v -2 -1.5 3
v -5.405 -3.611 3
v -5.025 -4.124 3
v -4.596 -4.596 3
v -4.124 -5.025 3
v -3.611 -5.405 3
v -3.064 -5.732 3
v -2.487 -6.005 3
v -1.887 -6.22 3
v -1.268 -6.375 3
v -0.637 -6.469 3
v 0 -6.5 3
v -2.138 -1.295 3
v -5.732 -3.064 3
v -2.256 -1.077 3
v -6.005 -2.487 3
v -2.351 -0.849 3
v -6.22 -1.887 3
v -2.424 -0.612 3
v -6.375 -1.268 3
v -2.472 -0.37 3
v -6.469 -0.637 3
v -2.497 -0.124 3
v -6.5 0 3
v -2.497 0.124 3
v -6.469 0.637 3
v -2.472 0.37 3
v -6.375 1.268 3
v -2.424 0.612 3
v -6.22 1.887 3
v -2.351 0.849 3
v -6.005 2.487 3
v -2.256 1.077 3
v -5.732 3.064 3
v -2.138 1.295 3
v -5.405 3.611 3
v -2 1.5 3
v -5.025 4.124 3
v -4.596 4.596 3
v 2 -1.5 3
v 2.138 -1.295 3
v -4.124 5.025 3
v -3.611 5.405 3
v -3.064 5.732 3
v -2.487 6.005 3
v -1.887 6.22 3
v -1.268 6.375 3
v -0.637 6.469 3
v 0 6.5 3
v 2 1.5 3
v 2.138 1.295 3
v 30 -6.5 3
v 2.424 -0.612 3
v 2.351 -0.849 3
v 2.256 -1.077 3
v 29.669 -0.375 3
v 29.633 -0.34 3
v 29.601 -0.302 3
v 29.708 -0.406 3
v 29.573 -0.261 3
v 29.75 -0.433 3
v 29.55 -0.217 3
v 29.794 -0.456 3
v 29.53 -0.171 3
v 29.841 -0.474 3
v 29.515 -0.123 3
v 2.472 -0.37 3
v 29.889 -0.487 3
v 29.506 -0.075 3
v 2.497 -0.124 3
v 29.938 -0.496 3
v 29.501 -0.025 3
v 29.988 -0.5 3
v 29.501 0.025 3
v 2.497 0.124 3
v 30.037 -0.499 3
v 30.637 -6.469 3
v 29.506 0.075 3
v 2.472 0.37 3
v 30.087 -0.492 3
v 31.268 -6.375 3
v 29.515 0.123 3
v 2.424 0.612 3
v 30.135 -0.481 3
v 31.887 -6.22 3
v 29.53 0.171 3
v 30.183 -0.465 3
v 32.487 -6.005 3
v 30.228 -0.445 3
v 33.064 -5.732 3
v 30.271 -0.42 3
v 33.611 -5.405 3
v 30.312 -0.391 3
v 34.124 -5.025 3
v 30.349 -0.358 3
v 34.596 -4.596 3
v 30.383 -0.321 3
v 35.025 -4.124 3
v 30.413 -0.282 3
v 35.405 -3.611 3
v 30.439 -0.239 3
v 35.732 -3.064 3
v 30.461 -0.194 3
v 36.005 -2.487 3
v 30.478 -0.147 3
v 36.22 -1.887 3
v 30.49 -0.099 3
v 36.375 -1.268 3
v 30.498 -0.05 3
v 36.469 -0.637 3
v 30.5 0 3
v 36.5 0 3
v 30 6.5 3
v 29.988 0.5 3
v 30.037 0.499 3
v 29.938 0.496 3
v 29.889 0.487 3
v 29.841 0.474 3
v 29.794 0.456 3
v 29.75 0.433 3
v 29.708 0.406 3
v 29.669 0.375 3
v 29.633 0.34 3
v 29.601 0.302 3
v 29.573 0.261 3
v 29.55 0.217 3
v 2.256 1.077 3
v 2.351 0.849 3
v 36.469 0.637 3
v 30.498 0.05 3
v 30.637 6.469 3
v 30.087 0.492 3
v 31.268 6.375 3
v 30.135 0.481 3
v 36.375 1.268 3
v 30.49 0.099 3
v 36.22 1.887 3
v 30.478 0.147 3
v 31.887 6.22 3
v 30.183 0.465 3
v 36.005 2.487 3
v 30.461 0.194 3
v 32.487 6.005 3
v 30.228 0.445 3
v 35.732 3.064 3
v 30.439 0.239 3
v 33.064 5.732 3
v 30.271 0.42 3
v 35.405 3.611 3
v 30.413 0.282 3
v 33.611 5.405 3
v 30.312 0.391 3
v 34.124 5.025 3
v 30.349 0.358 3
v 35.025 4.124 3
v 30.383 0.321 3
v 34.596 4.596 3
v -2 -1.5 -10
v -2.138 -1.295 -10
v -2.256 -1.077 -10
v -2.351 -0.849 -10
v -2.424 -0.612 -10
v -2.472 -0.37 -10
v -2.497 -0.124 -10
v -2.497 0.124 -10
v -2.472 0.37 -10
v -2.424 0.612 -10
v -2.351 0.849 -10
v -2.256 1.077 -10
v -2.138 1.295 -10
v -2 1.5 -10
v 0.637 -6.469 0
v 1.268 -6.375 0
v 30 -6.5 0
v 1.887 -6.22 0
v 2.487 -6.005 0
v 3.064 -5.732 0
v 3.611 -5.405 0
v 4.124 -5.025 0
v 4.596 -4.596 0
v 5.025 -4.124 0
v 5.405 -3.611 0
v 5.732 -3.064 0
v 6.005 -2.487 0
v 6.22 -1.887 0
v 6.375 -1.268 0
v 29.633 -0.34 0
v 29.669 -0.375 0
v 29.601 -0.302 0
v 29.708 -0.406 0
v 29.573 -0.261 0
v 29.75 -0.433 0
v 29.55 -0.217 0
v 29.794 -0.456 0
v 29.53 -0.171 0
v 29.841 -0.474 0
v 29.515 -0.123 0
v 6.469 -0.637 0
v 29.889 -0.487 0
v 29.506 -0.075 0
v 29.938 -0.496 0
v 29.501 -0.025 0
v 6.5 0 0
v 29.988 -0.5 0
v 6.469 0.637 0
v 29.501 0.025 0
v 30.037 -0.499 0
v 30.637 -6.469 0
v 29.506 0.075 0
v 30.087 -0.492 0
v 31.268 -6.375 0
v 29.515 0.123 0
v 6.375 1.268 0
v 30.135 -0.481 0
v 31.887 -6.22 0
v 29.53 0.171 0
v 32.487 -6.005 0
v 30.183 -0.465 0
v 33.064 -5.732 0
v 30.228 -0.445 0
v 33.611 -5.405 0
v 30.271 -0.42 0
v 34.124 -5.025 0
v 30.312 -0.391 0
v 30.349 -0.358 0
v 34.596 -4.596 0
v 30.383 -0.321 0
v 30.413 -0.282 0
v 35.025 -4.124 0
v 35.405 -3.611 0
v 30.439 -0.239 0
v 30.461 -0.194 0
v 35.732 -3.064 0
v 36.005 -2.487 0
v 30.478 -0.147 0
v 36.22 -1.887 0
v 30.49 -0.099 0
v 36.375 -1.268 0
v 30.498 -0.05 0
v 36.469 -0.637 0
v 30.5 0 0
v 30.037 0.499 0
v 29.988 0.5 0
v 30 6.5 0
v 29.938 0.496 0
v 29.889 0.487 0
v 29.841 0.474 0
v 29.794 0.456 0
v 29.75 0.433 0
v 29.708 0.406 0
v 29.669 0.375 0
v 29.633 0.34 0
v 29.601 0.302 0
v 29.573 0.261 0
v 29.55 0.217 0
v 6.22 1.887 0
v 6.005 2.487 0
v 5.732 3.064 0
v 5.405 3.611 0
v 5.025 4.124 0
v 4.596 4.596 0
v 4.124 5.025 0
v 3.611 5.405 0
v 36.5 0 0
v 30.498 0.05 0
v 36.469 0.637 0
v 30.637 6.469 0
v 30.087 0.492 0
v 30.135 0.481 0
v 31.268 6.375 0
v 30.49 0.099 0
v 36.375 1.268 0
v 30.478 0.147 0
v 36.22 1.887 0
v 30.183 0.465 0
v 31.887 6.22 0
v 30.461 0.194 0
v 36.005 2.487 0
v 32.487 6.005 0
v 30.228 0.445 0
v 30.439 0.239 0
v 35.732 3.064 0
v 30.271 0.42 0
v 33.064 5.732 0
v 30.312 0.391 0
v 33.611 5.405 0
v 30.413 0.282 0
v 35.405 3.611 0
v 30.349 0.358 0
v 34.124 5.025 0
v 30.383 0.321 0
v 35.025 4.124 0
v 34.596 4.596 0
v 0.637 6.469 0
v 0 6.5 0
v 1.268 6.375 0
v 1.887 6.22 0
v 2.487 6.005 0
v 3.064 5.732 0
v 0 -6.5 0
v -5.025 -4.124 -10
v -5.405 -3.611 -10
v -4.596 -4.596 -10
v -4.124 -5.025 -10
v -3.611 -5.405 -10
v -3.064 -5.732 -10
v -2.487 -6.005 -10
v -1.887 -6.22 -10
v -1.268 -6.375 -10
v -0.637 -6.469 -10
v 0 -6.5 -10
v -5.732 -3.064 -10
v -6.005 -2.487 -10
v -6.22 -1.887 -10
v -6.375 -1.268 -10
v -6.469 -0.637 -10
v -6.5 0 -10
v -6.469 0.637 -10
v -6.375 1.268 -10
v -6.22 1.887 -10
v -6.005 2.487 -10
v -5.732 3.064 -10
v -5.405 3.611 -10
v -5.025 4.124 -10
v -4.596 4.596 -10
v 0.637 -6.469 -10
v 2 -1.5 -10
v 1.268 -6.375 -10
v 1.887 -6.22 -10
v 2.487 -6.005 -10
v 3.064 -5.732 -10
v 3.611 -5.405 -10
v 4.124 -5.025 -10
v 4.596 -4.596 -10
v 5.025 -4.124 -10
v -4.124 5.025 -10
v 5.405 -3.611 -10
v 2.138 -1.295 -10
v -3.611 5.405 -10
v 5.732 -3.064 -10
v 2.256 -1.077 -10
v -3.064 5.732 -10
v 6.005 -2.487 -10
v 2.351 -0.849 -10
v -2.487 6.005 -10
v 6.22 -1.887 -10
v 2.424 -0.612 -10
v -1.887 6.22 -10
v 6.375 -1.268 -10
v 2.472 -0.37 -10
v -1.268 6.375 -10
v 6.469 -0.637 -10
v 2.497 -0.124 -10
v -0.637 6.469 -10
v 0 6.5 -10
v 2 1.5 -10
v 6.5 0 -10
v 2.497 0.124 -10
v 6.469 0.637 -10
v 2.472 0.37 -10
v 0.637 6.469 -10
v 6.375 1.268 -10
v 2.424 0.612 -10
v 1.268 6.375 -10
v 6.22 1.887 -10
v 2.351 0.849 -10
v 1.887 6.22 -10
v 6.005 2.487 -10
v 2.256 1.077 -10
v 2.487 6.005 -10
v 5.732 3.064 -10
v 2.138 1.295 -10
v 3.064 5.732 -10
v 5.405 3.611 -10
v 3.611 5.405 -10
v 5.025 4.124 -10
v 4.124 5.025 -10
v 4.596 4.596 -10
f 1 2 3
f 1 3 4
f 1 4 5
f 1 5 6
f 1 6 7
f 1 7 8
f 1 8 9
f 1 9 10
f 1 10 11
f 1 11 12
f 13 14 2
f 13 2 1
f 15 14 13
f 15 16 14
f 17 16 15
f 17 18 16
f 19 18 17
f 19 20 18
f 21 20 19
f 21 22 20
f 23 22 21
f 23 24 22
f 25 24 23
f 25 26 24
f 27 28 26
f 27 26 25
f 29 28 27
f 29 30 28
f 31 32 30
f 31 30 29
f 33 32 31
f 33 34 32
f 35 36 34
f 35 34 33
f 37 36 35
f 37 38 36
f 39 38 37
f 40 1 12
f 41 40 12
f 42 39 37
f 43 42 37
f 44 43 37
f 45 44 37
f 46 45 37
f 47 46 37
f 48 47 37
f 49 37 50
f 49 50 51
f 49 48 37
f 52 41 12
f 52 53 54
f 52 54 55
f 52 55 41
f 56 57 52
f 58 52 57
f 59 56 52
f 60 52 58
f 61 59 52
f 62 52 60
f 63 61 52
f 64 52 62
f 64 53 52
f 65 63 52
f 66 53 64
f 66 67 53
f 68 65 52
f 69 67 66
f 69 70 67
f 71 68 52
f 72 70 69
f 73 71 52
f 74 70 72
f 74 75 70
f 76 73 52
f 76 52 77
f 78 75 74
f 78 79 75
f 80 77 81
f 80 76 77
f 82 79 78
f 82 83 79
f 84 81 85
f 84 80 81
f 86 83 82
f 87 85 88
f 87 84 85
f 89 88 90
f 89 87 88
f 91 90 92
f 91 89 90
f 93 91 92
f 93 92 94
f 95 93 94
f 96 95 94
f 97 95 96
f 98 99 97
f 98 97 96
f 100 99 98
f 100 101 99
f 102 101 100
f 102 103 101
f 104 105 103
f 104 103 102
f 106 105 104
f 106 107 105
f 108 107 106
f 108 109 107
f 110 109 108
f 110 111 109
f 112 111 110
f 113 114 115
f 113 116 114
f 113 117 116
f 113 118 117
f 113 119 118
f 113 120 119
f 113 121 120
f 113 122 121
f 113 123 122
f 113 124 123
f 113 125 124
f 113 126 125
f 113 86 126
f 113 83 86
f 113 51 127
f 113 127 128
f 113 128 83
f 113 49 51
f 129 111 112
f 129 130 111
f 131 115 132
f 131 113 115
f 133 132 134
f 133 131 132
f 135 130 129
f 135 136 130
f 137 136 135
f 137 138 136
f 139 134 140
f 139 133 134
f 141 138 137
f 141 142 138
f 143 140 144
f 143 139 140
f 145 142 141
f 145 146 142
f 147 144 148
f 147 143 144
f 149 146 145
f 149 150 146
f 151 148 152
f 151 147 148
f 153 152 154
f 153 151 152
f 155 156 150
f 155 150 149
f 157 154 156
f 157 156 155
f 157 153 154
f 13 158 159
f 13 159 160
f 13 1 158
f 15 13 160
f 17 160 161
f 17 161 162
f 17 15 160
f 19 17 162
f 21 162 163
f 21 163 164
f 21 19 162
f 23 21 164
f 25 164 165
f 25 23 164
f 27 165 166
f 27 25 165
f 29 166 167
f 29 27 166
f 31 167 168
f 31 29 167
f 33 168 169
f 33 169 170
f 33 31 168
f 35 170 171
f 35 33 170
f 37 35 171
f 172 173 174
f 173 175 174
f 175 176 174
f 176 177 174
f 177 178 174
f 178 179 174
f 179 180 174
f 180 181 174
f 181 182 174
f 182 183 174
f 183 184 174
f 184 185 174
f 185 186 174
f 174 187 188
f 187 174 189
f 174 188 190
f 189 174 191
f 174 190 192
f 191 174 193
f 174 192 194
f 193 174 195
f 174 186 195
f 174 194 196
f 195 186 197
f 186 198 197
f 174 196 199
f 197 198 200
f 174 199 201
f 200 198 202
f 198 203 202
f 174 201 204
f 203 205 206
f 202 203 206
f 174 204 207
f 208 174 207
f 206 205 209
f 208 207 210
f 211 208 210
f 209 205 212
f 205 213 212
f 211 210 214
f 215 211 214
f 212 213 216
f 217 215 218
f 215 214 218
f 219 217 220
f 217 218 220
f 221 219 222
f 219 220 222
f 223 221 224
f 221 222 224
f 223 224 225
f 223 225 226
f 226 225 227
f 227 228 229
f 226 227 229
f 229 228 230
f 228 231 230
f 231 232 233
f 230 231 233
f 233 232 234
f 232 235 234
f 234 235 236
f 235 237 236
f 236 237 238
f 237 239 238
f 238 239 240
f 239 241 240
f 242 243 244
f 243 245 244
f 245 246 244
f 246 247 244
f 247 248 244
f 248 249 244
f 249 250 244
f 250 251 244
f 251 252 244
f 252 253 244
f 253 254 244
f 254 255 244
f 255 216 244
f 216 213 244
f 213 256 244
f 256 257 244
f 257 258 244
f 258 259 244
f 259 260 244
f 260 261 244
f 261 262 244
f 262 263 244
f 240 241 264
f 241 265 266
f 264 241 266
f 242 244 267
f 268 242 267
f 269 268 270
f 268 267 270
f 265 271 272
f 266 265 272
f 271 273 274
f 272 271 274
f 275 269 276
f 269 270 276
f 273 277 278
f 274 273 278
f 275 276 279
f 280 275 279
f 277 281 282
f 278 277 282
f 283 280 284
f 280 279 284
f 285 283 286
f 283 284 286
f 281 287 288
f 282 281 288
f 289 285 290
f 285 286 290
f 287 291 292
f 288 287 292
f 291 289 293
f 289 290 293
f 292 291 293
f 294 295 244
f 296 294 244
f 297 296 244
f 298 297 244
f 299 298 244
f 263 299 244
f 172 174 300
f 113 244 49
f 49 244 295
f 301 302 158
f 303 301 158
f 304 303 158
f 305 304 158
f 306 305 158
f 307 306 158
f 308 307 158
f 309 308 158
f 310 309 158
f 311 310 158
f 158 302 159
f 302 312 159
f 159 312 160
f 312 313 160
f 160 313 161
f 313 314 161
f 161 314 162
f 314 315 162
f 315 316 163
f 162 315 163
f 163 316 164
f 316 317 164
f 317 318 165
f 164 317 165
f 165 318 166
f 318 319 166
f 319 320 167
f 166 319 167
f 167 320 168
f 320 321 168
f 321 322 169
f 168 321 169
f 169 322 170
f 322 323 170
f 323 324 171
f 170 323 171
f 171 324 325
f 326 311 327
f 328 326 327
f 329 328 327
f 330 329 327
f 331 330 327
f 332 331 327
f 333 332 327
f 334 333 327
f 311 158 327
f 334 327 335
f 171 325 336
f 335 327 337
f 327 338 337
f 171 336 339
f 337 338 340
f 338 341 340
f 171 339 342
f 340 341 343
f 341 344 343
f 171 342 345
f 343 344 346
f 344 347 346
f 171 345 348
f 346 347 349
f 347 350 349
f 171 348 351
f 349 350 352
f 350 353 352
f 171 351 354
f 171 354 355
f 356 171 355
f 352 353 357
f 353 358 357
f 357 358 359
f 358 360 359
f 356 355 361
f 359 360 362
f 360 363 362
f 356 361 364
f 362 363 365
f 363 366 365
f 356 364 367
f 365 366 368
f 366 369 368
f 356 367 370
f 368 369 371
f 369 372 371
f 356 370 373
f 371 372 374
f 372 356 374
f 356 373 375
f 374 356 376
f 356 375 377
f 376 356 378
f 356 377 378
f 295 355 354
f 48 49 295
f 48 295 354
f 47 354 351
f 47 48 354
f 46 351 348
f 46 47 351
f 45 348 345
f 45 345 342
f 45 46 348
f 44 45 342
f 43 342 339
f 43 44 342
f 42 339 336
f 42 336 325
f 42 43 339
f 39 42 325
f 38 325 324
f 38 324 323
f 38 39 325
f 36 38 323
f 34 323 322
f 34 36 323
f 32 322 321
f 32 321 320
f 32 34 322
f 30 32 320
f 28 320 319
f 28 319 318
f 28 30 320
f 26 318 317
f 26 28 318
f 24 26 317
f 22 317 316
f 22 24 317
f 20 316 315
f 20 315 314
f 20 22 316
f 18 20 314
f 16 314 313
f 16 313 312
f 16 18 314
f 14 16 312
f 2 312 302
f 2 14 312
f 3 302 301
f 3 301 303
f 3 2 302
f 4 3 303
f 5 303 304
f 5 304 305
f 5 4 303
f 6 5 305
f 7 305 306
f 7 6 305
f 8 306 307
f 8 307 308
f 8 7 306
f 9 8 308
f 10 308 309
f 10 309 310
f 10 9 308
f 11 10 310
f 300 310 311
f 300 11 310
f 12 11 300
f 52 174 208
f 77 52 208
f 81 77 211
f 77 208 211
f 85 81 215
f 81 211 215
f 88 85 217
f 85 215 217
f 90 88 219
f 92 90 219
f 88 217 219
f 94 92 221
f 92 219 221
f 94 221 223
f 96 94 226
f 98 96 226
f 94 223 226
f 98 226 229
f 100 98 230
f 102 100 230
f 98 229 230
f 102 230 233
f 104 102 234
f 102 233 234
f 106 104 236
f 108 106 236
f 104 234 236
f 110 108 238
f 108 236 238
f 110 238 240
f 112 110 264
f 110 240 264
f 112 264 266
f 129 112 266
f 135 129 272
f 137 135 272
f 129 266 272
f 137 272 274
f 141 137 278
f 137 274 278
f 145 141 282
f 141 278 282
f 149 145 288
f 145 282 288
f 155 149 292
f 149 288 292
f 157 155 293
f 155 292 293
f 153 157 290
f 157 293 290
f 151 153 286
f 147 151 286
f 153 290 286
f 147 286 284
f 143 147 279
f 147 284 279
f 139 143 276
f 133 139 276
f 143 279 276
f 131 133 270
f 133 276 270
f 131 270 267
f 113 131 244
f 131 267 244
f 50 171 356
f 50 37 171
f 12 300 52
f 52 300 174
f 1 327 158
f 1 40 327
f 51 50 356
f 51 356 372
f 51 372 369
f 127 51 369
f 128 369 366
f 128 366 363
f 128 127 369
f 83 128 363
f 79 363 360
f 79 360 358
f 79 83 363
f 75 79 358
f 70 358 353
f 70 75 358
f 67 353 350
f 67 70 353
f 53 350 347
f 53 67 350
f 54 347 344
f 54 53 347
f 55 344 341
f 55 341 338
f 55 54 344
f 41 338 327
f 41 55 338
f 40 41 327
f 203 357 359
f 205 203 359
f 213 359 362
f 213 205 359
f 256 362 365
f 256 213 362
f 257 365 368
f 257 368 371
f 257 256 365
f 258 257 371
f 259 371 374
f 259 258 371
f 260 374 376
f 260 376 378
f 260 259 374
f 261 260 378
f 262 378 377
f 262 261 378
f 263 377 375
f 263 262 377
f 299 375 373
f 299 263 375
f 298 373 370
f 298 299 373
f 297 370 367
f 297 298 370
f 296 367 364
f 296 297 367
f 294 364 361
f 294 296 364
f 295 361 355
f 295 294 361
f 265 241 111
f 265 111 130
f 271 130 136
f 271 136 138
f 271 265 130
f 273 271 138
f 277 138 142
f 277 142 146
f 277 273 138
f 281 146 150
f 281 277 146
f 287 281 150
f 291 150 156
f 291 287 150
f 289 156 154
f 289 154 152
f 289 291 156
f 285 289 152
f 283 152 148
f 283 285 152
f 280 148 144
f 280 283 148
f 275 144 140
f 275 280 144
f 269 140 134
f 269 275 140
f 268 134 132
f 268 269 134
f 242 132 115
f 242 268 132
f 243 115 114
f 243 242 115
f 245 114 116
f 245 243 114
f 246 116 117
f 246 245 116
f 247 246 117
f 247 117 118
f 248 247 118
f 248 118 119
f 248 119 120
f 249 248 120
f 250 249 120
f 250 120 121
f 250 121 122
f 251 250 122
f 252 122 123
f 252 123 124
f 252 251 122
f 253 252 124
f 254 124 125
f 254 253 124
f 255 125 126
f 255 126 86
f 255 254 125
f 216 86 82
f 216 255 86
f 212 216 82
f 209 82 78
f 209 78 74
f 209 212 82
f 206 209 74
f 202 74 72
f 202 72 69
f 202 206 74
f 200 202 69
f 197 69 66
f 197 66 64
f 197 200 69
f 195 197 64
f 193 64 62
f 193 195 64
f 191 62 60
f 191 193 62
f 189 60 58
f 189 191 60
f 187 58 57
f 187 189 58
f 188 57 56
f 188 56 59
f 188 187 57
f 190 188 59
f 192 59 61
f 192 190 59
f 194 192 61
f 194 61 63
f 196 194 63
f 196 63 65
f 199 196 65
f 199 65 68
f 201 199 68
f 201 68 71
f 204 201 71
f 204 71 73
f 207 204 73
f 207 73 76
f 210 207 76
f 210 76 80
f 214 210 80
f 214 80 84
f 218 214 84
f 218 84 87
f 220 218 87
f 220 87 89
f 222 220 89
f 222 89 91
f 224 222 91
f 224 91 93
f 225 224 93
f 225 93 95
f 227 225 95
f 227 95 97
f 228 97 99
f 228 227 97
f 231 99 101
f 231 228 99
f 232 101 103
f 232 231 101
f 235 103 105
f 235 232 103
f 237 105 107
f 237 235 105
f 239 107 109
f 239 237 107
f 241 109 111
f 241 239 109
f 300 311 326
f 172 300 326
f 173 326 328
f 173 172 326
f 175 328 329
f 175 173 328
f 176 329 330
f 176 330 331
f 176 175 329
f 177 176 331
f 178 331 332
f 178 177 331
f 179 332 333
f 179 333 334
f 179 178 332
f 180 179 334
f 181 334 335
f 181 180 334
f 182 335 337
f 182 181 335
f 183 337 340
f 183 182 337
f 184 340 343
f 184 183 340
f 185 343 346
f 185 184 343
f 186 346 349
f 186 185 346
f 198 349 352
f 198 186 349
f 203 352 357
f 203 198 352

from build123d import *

# Parameters (mm, degrees)
F0_R     = 0.5
F1_DEPTH = 3
F2_DEPTH = 10


with BuildPart() as f1:
    # F0 (on Top) → F1 (new body)
    with BuildSketch(Plane.XY):
        with BuildLine():
            ThreePointArc((0, -6.5), (4.596194, -4.596194), (6.5, 0))
            ThreePointArc((6.5, 0), (4.596194, 4.596194), (0, 6.5))
            ThreePointArc((0, 6.5), (-6.5, 0), (0, -6.5))
        make_face()
        with BuildLine():
            ThreePointArc((2, 1.5), (2.5, 0), (2, -1.5))
            Line((2, -1.5), (-2, -1.5))
            ThreePointArc((-2, -1.5), (-2.5, 0), (-2, 1.5))
            Line((-2, 1.5), (2, 1.5))
        make_face(mode=Mode.SUBTRACT)
        with BuildLine():
            ThreePointArc((0, 6.5), (4.596194, 4.596194), (6.5, 0))
            ThreePointArc((6.5, 0), (4.596194, -4.596194), (0, -6.5))
            Line((0, -6.5), (30, -6.5))
            ThreePointArc((30, -6.5), (23.5, 0), (30, 6.5))
            Line((30, 6.5), (0, 6.5))
        make_face()
        with BuildLine():
            ThreePointArc((36.5, 0), (34.596194, 4.596194), (30, 6.5))
            ThreePointArc((30, 6.5), (23.5, 0), (30, -6.5))
            ThreePointArc((30, -6.5), (34.596194, -4.596194), (36.5, 0))
        make_face()
        with Locations((30, 0)):
            Circle(F0_R, mode=Mode.SUBTRACT)
    extrude(amount=F1_DEPTH)

    # F0 (on Top) → F2 (join)
    with BuildSketch(Plane.XY):
        with BuildLine():
            ThreePointArc((0, -6.5), (4.596194, -4.596194), (6.5, 0))
            ThreePointArc((6.5, 0), (4.596194, 4.596194), (0, 6.5))
            ThreePointArc((0, 6.5), (-6.5, 0), (0, -6.5))
        make_face()
        with BuildLine():
            ThreePointArc((2, 1.5), (2.5, 0), (2, -1.5))
            Line((2, -1.5), (-2, -1.5))
            ThreePointArc((-2, -1.5), (-2.5, 0), (-2, 1.5))
            Line((-2, 1.5), (2, 1.5))
        make_face(mode=Mode.SUBTRACT)
    extrude(amount=-F2_DEPTH)


solid = f1.part
